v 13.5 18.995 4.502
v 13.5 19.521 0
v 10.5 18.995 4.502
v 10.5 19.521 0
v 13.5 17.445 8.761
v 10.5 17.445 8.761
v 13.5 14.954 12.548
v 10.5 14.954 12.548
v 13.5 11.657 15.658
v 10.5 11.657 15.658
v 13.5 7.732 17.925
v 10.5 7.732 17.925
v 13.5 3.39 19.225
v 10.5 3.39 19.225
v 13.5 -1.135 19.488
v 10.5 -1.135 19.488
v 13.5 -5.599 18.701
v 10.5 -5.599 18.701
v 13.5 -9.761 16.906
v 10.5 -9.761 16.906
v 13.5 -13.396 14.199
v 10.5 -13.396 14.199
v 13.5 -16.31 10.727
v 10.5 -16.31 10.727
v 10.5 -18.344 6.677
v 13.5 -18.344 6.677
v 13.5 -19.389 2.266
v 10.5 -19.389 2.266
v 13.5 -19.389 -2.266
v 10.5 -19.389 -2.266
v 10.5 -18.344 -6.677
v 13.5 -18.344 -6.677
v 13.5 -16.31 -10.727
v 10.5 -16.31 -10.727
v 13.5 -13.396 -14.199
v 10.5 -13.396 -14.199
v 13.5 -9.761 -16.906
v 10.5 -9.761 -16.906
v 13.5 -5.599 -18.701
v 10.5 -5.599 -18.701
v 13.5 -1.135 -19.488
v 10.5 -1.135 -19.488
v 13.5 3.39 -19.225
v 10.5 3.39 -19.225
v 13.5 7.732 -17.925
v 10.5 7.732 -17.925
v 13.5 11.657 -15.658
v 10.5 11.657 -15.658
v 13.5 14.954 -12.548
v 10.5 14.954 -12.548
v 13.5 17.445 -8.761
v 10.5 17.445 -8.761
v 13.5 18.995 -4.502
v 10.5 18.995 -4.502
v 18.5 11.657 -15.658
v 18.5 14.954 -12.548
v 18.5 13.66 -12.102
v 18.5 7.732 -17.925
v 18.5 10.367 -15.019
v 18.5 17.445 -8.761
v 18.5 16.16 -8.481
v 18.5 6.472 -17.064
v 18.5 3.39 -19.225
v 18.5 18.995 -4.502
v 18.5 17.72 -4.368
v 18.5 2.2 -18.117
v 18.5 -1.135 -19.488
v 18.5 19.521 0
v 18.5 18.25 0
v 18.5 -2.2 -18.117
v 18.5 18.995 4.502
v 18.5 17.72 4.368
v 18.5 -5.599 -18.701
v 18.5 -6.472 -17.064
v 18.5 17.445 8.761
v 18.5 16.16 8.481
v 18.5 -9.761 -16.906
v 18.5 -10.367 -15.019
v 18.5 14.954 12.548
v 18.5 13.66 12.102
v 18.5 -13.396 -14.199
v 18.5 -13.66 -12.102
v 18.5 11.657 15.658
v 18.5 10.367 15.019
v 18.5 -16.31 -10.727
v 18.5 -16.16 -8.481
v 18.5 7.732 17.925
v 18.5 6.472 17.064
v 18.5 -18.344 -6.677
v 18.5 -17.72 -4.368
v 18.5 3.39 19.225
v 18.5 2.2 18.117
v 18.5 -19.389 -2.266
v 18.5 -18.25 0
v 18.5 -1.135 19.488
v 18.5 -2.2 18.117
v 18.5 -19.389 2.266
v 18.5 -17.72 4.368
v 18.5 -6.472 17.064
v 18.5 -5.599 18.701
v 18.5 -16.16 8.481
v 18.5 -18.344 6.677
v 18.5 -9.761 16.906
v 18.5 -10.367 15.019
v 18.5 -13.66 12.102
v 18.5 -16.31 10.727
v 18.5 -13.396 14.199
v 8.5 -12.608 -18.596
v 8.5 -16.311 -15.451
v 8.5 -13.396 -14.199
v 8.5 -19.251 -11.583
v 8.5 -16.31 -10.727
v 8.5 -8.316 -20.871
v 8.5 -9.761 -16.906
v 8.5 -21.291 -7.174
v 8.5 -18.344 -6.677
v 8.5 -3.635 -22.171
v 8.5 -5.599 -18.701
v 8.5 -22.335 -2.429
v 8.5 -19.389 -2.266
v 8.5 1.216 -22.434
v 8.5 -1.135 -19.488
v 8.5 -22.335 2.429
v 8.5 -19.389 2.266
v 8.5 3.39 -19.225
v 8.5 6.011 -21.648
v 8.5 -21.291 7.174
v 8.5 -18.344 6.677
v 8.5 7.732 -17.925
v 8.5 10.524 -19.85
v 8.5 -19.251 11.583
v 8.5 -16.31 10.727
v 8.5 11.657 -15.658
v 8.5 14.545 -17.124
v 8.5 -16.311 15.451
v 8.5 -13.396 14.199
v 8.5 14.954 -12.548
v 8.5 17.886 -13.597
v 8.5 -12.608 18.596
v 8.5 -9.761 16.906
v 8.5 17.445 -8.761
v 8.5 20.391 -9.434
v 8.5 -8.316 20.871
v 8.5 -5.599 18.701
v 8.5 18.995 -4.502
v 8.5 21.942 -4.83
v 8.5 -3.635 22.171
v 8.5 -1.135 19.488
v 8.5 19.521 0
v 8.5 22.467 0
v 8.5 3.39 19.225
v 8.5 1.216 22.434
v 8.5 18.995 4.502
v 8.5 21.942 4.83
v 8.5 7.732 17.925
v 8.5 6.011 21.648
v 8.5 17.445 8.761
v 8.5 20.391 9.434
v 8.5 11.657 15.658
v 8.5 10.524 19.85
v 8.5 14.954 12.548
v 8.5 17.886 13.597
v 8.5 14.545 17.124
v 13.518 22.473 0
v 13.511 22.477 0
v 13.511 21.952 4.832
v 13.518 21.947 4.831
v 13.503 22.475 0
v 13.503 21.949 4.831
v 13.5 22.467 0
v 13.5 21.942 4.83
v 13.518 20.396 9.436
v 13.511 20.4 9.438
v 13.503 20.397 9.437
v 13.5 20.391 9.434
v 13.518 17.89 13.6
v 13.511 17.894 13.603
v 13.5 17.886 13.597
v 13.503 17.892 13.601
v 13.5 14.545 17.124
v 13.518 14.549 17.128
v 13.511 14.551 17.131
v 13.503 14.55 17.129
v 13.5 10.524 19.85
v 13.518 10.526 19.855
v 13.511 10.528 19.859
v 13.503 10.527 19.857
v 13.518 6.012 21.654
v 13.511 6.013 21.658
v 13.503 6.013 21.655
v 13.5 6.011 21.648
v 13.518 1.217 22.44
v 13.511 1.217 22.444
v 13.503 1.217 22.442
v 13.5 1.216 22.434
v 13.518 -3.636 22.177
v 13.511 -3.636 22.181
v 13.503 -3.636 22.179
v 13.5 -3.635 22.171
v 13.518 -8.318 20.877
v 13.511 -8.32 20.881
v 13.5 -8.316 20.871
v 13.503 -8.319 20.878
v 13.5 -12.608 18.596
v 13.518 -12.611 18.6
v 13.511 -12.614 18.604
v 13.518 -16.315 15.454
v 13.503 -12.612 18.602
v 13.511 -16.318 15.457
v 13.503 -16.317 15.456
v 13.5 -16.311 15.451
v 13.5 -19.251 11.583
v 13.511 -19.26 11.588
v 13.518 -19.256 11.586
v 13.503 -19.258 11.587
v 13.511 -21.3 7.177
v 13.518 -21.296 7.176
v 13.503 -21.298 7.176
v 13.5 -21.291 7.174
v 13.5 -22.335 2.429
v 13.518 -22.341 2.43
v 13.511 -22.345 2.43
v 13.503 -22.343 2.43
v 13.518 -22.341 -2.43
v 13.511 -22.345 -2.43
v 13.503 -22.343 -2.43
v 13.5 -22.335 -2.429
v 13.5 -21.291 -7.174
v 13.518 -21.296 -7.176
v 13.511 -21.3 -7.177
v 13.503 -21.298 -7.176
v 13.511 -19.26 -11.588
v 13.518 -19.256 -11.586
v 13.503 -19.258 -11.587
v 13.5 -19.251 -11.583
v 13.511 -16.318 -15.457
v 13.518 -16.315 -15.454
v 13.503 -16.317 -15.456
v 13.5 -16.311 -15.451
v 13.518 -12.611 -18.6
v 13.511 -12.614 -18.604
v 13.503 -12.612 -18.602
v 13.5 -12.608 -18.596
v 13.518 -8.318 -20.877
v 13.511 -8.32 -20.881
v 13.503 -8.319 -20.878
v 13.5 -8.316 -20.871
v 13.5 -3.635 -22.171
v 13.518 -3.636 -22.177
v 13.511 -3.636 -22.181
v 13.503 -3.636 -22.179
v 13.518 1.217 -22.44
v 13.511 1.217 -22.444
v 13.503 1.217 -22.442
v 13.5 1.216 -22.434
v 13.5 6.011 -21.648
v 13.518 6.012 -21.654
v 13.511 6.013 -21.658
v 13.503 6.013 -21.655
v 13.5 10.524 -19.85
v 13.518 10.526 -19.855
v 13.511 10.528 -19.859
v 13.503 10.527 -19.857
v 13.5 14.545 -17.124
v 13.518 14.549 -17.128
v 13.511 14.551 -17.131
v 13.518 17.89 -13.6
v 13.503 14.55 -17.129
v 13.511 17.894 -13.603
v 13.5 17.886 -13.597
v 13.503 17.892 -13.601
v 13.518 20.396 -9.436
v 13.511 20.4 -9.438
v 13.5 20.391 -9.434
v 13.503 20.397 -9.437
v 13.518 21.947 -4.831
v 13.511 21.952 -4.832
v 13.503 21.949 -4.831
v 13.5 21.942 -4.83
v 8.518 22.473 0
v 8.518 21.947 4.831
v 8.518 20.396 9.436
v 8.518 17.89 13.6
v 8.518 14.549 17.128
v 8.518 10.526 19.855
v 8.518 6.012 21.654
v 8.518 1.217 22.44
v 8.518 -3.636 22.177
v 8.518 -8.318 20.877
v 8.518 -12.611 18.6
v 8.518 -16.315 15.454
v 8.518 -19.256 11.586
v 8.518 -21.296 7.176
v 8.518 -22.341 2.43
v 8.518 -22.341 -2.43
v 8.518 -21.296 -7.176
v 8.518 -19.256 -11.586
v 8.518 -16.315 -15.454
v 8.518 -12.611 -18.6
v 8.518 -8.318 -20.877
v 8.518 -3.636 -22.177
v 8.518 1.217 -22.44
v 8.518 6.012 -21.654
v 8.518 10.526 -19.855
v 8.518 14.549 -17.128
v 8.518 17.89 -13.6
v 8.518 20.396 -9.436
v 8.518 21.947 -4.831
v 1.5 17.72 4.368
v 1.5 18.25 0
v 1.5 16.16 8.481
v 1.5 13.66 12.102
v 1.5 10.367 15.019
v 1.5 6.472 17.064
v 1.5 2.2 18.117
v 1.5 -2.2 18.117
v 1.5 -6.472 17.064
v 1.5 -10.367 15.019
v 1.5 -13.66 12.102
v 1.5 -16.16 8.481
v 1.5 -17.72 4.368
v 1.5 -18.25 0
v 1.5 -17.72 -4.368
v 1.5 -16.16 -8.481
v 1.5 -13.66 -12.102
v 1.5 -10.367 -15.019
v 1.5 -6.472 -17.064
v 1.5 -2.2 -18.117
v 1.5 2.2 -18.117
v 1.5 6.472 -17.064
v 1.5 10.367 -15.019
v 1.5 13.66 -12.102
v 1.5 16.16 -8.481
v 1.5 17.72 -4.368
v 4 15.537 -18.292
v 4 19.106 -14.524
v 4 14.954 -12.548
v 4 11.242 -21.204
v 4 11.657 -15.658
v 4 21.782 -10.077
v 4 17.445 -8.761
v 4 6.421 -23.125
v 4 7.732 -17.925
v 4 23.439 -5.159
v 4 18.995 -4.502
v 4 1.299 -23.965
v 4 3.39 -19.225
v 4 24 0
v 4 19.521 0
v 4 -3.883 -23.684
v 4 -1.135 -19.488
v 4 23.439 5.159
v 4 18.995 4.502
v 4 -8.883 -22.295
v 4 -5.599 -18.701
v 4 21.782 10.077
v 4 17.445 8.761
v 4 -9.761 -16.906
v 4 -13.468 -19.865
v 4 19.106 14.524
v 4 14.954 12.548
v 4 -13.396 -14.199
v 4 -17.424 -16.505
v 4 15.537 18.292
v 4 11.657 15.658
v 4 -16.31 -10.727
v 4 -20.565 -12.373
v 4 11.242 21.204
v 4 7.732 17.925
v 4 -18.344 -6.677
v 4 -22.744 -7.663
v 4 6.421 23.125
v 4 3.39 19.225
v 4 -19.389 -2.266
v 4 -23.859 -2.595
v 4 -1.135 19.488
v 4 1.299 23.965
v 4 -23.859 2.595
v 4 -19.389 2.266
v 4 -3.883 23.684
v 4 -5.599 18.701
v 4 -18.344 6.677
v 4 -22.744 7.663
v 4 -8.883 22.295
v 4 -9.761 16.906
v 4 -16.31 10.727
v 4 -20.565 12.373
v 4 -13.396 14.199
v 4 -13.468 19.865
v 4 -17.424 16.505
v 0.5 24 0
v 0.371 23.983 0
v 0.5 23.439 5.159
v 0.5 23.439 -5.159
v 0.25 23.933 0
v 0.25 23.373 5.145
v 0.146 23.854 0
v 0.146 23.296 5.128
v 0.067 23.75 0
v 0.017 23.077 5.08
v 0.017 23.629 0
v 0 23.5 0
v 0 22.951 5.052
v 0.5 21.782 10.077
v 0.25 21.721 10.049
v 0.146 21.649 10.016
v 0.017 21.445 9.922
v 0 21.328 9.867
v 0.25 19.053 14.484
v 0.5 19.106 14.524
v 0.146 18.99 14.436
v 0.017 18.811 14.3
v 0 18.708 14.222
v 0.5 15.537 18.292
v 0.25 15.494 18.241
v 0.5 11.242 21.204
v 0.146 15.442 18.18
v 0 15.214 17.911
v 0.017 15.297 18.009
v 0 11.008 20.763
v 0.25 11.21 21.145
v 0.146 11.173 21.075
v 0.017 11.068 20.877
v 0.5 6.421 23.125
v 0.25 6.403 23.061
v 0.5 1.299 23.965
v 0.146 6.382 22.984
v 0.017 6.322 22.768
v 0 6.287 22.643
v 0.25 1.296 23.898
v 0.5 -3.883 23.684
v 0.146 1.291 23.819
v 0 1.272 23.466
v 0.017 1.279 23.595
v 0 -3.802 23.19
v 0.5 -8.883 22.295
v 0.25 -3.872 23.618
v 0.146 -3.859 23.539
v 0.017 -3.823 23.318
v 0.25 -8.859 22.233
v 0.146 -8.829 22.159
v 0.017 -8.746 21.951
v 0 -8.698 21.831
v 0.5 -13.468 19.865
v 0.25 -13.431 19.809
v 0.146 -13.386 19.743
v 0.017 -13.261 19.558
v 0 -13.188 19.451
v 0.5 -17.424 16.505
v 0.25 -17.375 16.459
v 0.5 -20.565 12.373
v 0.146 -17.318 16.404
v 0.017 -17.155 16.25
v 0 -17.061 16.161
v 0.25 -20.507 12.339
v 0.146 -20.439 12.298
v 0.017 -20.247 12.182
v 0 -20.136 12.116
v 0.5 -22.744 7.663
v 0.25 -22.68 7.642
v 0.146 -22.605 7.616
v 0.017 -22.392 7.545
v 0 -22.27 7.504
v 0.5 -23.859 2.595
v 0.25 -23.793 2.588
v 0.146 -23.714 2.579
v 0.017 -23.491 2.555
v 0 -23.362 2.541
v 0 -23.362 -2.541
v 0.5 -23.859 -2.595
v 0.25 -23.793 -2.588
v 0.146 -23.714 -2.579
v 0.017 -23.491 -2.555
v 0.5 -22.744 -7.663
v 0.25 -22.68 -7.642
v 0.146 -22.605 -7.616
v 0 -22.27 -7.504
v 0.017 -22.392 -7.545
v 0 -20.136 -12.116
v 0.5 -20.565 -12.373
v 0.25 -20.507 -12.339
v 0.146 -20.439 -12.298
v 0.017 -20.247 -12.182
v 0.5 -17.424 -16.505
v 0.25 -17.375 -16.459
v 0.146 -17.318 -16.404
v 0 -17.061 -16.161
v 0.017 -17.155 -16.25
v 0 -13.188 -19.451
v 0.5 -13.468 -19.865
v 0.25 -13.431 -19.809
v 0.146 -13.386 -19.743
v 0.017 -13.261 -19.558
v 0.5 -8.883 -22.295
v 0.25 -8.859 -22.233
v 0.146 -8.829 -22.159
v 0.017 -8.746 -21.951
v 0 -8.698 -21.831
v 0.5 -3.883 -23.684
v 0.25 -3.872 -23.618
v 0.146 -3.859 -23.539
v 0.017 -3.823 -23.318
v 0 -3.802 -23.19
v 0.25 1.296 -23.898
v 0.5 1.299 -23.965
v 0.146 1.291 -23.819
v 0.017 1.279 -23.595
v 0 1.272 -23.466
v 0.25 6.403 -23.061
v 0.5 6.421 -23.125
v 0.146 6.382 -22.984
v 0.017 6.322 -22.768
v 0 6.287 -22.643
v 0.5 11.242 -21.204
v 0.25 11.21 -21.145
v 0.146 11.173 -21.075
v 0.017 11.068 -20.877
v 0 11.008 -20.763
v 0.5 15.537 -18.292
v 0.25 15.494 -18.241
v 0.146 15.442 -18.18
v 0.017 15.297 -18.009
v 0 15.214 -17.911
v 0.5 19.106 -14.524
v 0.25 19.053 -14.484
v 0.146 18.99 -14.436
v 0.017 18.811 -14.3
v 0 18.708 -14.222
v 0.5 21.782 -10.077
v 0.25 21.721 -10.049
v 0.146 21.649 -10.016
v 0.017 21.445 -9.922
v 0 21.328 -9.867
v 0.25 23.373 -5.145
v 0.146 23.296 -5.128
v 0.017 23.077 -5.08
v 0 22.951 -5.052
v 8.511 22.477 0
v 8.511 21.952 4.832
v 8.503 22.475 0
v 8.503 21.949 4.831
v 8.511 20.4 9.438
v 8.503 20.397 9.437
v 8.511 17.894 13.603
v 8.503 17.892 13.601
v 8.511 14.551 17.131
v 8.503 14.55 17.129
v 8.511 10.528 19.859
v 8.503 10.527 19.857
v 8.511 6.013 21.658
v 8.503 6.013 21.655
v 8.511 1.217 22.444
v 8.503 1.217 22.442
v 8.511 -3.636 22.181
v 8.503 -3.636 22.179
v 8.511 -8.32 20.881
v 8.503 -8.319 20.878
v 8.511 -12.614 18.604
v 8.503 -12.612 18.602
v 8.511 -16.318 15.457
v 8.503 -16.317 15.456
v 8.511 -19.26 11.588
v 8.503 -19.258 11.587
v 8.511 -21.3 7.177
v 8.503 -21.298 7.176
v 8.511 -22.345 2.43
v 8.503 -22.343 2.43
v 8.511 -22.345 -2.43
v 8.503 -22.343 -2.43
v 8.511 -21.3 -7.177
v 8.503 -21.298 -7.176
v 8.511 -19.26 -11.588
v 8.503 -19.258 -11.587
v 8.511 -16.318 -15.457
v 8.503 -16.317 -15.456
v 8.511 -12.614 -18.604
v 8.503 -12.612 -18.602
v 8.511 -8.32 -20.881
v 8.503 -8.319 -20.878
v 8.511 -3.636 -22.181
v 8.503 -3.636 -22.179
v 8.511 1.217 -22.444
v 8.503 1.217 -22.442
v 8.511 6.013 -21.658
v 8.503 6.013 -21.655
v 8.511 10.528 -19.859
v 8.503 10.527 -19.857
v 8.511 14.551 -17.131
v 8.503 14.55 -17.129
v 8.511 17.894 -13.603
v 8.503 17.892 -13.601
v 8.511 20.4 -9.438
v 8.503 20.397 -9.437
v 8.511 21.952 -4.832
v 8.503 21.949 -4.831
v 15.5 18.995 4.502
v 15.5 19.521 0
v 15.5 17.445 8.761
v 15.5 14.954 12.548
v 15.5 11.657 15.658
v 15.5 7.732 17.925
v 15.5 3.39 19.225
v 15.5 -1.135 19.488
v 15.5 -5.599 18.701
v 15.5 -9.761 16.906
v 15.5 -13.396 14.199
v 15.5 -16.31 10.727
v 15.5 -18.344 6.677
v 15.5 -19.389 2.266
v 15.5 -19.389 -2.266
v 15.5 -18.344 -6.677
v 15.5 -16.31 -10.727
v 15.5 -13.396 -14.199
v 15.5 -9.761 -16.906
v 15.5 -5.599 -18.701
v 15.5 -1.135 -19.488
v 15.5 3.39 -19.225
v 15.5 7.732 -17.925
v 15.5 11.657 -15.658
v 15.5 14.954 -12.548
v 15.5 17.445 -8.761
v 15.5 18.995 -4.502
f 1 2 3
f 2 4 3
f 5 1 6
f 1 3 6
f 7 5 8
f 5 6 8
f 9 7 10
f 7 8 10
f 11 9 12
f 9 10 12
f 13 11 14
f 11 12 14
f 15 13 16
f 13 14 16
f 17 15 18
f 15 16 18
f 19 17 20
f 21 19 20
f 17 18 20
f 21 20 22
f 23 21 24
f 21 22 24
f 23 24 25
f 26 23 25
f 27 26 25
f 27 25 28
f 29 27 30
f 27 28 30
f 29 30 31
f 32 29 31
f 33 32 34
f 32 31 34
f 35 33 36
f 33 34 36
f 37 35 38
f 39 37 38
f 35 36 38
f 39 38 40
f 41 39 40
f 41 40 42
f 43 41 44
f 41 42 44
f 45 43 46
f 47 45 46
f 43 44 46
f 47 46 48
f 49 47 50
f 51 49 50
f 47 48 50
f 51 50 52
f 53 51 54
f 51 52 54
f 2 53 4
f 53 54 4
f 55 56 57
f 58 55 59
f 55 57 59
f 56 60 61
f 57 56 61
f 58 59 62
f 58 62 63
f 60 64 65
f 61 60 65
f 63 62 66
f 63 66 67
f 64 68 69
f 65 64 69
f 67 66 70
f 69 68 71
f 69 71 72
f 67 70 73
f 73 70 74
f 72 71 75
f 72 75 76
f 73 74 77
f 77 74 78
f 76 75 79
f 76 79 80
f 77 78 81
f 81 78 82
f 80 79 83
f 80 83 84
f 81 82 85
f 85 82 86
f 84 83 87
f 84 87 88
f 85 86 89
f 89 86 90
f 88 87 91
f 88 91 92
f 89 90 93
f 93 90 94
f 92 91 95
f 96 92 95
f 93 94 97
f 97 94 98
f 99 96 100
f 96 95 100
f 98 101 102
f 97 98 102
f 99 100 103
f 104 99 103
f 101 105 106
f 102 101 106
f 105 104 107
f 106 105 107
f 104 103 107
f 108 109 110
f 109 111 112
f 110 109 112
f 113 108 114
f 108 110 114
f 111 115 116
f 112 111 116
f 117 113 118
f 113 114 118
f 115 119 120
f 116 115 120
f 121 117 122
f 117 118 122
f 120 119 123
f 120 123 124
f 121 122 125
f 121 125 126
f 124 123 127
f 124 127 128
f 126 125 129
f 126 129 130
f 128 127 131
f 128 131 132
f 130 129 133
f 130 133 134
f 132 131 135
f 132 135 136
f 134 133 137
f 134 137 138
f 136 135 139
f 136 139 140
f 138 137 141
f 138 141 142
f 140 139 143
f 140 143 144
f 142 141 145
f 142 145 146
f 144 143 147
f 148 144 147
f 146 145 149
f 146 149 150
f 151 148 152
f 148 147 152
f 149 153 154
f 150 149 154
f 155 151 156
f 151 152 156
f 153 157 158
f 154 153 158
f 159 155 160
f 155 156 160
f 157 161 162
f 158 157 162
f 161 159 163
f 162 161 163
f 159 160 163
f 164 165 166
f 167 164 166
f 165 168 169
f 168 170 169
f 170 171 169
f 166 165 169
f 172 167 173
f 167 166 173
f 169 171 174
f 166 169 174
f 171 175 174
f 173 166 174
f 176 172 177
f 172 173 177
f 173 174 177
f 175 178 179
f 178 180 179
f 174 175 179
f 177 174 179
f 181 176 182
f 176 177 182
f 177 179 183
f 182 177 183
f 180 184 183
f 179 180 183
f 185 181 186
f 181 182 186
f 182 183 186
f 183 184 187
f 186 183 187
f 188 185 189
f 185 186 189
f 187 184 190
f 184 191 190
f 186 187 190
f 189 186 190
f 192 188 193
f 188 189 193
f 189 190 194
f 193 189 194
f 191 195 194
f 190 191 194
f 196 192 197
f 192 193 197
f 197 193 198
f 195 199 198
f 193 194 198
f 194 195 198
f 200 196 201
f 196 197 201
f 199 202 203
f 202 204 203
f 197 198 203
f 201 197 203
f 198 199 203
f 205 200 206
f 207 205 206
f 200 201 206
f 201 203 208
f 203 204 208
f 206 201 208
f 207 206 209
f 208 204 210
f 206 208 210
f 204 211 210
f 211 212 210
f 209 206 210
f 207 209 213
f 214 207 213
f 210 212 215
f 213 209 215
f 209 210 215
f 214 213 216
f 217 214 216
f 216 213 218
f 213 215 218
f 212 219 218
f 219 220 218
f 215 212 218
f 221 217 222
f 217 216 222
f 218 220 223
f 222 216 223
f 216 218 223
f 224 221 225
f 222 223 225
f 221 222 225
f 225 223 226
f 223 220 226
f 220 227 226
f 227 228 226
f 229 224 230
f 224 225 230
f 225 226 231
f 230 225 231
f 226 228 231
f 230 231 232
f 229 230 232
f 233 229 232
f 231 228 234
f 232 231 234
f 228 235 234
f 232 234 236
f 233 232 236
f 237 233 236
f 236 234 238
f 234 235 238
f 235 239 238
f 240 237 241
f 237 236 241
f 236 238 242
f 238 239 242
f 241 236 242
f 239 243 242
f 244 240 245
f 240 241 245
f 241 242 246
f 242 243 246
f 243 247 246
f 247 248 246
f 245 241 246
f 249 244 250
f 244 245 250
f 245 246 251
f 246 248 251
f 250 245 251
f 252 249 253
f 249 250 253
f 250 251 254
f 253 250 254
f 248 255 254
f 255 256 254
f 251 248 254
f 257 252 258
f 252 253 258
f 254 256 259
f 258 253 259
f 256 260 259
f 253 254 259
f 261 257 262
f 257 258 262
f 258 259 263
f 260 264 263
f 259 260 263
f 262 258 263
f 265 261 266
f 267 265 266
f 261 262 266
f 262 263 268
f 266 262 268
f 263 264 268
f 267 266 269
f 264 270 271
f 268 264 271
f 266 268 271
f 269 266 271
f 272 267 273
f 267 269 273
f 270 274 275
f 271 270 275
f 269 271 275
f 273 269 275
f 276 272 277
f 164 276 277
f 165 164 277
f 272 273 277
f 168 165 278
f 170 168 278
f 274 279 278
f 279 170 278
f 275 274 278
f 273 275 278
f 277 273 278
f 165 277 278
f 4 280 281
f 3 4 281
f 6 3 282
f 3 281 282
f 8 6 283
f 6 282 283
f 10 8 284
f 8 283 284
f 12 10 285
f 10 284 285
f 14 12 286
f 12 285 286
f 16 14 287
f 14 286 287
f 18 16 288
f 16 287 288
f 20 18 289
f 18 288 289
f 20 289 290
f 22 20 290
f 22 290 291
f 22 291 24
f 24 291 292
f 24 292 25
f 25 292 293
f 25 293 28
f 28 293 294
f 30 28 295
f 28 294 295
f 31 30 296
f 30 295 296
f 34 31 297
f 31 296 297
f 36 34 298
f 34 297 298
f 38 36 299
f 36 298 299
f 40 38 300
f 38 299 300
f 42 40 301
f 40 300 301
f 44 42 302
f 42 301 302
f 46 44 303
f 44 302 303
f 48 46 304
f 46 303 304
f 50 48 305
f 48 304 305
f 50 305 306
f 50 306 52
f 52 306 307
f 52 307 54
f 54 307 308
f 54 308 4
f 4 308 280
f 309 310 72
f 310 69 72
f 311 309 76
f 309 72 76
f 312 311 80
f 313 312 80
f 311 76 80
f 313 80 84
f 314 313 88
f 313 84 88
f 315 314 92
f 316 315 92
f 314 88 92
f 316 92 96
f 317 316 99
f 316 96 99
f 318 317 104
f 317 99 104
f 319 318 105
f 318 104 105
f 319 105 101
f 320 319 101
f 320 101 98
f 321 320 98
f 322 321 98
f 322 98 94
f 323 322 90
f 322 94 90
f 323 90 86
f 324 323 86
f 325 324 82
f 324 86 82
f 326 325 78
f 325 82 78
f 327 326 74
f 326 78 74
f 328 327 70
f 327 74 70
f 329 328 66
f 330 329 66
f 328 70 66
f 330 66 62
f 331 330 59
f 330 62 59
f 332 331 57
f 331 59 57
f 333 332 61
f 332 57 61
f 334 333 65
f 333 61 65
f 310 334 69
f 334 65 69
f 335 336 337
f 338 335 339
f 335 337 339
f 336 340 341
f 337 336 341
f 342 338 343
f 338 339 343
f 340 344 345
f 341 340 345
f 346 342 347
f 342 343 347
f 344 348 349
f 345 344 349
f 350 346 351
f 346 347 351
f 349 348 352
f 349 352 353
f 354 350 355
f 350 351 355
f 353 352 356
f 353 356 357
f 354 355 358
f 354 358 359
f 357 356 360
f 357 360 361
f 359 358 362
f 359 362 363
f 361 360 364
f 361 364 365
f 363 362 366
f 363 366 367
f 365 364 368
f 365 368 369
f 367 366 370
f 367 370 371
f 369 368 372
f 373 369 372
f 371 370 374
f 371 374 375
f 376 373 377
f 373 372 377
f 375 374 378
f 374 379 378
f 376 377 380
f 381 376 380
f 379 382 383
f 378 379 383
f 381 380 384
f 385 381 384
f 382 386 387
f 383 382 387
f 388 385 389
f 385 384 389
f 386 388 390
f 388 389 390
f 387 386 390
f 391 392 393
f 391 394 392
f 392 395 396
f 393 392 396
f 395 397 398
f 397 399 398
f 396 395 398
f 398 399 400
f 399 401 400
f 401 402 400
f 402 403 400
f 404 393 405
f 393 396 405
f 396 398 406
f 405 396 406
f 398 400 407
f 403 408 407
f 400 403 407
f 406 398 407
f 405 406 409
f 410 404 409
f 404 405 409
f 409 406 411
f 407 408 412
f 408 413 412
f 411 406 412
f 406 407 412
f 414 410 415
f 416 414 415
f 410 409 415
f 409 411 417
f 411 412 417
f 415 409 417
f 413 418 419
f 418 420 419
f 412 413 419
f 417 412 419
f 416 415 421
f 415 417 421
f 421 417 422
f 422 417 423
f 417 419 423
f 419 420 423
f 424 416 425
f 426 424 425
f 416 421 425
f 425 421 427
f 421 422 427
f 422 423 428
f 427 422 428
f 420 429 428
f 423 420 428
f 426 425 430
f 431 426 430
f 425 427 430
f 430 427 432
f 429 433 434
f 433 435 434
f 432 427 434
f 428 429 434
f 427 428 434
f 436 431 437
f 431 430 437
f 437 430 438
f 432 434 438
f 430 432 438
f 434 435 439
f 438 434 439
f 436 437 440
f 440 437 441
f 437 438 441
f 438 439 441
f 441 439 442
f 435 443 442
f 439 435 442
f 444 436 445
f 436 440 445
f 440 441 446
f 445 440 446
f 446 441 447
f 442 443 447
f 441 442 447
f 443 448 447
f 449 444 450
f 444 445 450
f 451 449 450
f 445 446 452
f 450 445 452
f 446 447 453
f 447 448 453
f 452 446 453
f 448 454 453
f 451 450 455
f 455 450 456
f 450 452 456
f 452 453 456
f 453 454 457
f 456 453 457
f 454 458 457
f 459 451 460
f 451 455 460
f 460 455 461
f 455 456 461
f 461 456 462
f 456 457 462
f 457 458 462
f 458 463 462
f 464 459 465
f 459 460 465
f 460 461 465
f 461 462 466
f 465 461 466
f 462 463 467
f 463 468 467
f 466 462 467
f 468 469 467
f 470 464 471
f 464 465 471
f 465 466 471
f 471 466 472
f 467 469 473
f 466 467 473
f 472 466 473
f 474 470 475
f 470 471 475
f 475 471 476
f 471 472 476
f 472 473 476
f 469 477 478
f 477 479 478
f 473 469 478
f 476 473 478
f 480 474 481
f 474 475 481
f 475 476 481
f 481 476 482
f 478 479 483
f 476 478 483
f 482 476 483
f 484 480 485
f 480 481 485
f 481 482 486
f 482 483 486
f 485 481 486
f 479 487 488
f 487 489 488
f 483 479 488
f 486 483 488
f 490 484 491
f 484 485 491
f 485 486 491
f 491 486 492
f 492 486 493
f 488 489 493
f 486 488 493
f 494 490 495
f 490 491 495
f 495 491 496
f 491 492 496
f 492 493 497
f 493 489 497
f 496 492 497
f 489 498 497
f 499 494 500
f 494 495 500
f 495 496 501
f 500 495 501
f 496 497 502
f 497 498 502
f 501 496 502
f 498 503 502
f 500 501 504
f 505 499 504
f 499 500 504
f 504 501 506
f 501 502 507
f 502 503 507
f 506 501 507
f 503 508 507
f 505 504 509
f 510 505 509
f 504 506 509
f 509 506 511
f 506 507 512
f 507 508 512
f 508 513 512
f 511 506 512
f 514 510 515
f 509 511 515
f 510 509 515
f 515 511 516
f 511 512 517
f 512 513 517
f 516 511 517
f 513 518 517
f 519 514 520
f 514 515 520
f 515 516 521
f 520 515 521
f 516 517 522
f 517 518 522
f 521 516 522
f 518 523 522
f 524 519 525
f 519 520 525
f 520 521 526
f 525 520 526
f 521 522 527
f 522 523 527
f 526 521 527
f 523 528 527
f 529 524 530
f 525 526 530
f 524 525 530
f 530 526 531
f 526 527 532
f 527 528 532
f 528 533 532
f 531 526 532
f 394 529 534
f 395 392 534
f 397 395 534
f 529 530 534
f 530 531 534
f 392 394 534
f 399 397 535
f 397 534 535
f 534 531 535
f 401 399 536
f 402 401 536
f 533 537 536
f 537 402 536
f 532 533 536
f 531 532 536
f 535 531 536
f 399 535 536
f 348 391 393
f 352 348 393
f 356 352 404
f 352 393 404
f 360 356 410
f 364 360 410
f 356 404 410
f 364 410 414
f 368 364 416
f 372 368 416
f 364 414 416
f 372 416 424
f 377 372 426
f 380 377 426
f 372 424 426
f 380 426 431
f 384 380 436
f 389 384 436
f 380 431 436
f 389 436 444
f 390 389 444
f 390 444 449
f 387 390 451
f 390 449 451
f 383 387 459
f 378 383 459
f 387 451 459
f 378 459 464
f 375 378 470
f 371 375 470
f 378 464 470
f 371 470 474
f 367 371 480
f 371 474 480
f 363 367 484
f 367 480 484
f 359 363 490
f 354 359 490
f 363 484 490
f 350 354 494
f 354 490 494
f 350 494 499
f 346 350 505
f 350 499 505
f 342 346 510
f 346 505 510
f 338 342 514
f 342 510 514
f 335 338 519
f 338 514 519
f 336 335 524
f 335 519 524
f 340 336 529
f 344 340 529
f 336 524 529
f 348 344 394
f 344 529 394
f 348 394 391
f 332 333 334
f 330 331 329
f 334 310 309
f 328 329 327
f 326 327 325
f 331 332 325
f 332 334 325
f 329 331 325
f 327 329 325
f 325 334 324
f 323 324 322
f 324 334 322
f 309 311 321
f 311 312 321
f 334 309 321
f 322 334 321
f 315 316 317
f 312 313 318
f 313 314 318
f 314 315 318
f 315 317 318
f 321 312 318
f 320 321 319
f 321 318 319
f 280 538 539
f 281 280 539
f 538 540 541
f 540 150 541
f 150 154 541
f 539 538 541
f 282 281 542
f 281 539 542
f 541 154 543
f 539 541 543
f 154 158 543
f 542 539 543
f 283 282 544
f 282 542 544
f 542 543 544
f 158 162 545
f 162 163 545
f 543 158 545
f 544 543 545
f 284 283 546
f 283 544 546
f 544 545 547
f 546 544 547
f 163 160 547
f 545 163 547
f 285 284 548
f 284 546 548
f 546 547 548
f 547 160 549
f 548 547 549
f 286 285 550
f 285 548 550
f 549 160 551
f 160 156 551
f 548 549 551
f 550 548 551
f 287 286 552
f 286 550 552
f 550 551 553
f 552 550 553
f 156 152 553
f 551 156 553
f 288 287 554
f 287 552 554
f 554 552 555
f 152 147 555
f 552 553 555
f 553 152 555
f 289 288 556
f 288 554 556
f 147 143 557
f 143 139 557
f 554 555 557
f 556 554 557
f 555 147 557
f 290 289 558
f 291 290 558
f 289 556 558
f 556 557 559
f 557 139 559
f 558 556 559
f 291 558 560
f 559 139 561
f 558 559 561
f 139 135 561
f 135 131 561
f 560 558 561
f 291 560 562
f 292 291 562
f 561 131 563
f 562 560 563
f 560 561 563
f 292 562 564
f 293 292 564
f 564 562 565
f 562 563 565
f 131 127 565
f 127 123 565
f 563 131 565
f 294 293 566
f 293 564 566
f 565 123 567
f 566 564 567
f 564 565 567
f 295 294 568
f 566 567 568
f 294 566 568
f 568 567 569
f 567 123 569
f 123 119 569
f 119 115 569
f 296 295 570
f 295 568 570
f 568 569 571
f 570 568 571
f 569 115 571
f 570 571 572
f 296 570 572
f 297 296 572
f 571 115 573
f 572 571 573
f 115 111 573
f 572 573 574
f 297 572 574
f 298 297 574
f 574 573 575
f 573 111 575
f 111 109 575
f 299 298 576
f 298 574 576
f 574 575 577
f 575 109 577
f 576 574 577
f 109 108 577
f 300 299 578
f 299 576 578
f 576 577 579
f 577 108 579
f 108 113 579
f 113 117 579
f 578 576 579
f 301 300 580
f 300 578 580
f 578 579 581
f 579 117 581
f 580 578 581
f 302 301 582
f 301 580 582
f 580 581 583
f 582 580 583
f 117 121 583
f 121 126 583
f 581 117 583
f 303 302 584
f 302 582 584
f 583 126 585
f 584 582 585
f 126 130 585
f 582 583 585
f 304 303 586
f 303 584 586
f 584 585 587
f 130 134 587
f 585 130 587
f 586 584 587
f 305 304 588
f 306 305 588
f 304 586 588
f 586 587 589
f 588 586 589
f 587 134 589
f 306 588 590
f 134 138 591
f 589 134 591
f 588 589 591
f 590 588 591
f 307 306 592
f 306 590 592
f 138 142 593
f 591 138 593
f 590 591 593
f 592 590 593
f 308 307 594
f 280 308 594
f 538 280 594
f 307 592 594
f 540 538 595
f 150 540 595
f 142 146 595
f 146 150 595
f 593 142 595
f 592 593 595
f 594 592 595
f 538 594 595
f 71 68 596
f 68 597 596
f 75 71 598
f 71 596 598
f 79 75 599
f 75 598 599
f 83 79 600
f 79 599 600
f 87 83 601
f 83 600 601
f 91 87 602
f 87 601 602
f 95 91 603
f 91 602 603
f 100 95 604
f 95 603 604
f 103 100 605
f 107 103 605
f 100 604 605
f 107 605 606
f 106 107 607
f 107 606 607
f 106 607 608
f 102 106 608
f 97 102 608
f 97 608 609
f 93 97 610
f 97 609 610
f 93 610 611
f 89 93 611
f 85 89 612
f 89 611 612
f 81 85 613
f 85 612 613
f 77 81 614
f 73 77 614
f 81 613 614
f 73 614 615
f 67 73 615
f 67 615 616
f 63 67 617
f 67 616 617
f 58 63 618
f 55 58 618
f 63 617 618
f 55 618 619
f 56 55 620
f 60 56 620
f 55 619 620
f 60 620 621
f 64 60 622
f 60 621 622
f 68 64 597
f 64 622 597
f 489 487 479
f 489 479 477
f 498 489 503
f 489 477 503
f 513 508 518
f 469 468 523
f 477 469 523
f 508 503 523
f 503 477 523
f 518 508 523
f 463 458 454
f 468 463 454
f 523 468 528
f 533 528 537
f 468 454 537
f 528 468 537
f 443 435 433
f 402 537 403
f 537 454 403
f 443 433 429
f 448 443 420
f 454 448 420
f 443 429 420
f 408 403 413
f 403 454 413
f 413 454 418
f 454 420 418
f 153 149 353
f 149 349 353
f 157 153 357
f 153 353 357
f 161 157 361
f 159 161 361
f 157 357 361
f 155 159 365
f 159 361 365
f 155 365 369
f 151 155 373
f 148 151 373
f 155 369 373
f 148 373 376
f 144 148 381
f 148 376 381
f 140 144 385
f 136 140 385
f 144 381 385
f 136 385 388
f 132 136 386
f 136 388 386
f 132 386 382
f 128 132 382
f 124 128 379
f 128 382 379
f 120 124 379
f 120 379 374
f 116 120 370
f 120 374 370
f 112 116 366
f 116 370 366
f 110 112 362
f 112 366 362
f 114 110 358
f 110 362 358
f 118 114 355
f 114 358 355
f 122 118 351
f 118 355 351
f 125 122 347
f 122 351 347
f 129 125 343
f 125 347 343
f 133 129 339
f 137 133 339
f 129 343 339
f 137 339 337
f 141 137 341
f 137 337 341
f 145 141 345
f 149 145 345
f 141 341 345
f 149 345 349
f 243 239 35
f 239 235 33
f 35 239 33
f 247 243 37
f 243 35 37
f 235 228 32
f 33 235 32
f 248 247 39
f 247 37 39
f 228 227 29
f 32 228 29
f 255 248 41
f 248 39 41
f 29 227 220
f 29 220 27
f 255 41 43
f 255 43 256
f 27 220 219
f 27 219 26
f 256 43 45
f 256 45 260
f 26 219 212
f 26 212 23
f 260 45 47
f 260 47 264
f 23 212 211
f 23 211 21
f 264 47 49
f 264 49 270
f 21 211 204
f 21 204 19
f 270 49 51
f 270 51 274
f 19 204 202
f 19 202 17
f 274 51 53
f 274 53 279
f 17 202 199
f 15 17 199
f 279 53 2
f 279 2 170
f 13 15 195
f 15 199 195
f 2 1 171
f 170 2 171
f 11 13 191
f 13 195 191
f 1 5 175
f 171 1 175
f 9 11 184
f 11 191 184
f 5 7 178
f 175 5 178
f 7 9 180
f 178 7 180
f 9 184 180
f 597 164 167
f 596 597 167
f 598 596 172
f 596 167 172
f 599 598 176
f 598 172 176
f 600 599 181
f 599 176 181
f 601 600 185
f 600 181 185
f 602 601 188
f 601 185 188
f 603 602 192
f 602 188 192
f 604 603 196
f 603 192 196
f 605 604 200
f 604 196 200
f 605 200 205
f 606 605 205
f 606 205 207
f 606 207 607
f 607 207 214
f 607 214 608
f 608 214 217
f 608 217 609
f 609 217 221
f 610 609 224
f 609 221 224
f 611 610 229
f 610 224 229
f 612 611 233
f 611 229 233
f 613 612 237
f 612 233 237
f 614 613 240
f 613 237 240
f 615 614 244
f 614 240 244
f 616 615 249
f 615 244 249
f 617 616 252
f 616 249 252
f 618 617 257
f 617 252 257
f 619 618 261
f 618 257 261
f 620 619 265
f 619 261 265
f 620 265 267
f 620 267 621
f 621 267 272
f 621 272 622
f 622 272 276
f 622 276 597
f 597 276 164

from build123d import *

# Parameters (mm, degrees)
FILLET1_R = 0.01
FILLET2_R = 0.5


with BuildPart() as part:
    # Sketch1 → Revolve1 (revolve)
    with BuildSketch(Plane.XY):
        Polygon((0, 24), (0, 0), (1.5, 0), (1.5, 18.25), (18.5, 18.25), (18.5, 19.521176082), (15.5, 19.521176082), (13.5, 22.5), (13.5, 19.521176082), (10.5, 19.521176082), (8.5, 22.5), (8.5, 19.521176082), (4, 19.521176082), (4, 24), align=None)
    revolve(axis=Axis((0, 0, 0), (1, 0, 0)))

    # Fillet1
    fillet1_edges = [part.edges().sort_by_distance(p)[0] for p in [
        (8.5, -22.5, 0),
        (13.5, -22.5, 0),
    ]]
    fillet(fillet1_edges, radius=FILLET1_R)

    # Fillet2
    fillet2_edges = [part.edges().sort_by_distance(p)[0] for p in [
        (0, -24, 0),
    ]]
    fillet(fillet2_edges, radius=FILLET2_R)


solid = part.part
